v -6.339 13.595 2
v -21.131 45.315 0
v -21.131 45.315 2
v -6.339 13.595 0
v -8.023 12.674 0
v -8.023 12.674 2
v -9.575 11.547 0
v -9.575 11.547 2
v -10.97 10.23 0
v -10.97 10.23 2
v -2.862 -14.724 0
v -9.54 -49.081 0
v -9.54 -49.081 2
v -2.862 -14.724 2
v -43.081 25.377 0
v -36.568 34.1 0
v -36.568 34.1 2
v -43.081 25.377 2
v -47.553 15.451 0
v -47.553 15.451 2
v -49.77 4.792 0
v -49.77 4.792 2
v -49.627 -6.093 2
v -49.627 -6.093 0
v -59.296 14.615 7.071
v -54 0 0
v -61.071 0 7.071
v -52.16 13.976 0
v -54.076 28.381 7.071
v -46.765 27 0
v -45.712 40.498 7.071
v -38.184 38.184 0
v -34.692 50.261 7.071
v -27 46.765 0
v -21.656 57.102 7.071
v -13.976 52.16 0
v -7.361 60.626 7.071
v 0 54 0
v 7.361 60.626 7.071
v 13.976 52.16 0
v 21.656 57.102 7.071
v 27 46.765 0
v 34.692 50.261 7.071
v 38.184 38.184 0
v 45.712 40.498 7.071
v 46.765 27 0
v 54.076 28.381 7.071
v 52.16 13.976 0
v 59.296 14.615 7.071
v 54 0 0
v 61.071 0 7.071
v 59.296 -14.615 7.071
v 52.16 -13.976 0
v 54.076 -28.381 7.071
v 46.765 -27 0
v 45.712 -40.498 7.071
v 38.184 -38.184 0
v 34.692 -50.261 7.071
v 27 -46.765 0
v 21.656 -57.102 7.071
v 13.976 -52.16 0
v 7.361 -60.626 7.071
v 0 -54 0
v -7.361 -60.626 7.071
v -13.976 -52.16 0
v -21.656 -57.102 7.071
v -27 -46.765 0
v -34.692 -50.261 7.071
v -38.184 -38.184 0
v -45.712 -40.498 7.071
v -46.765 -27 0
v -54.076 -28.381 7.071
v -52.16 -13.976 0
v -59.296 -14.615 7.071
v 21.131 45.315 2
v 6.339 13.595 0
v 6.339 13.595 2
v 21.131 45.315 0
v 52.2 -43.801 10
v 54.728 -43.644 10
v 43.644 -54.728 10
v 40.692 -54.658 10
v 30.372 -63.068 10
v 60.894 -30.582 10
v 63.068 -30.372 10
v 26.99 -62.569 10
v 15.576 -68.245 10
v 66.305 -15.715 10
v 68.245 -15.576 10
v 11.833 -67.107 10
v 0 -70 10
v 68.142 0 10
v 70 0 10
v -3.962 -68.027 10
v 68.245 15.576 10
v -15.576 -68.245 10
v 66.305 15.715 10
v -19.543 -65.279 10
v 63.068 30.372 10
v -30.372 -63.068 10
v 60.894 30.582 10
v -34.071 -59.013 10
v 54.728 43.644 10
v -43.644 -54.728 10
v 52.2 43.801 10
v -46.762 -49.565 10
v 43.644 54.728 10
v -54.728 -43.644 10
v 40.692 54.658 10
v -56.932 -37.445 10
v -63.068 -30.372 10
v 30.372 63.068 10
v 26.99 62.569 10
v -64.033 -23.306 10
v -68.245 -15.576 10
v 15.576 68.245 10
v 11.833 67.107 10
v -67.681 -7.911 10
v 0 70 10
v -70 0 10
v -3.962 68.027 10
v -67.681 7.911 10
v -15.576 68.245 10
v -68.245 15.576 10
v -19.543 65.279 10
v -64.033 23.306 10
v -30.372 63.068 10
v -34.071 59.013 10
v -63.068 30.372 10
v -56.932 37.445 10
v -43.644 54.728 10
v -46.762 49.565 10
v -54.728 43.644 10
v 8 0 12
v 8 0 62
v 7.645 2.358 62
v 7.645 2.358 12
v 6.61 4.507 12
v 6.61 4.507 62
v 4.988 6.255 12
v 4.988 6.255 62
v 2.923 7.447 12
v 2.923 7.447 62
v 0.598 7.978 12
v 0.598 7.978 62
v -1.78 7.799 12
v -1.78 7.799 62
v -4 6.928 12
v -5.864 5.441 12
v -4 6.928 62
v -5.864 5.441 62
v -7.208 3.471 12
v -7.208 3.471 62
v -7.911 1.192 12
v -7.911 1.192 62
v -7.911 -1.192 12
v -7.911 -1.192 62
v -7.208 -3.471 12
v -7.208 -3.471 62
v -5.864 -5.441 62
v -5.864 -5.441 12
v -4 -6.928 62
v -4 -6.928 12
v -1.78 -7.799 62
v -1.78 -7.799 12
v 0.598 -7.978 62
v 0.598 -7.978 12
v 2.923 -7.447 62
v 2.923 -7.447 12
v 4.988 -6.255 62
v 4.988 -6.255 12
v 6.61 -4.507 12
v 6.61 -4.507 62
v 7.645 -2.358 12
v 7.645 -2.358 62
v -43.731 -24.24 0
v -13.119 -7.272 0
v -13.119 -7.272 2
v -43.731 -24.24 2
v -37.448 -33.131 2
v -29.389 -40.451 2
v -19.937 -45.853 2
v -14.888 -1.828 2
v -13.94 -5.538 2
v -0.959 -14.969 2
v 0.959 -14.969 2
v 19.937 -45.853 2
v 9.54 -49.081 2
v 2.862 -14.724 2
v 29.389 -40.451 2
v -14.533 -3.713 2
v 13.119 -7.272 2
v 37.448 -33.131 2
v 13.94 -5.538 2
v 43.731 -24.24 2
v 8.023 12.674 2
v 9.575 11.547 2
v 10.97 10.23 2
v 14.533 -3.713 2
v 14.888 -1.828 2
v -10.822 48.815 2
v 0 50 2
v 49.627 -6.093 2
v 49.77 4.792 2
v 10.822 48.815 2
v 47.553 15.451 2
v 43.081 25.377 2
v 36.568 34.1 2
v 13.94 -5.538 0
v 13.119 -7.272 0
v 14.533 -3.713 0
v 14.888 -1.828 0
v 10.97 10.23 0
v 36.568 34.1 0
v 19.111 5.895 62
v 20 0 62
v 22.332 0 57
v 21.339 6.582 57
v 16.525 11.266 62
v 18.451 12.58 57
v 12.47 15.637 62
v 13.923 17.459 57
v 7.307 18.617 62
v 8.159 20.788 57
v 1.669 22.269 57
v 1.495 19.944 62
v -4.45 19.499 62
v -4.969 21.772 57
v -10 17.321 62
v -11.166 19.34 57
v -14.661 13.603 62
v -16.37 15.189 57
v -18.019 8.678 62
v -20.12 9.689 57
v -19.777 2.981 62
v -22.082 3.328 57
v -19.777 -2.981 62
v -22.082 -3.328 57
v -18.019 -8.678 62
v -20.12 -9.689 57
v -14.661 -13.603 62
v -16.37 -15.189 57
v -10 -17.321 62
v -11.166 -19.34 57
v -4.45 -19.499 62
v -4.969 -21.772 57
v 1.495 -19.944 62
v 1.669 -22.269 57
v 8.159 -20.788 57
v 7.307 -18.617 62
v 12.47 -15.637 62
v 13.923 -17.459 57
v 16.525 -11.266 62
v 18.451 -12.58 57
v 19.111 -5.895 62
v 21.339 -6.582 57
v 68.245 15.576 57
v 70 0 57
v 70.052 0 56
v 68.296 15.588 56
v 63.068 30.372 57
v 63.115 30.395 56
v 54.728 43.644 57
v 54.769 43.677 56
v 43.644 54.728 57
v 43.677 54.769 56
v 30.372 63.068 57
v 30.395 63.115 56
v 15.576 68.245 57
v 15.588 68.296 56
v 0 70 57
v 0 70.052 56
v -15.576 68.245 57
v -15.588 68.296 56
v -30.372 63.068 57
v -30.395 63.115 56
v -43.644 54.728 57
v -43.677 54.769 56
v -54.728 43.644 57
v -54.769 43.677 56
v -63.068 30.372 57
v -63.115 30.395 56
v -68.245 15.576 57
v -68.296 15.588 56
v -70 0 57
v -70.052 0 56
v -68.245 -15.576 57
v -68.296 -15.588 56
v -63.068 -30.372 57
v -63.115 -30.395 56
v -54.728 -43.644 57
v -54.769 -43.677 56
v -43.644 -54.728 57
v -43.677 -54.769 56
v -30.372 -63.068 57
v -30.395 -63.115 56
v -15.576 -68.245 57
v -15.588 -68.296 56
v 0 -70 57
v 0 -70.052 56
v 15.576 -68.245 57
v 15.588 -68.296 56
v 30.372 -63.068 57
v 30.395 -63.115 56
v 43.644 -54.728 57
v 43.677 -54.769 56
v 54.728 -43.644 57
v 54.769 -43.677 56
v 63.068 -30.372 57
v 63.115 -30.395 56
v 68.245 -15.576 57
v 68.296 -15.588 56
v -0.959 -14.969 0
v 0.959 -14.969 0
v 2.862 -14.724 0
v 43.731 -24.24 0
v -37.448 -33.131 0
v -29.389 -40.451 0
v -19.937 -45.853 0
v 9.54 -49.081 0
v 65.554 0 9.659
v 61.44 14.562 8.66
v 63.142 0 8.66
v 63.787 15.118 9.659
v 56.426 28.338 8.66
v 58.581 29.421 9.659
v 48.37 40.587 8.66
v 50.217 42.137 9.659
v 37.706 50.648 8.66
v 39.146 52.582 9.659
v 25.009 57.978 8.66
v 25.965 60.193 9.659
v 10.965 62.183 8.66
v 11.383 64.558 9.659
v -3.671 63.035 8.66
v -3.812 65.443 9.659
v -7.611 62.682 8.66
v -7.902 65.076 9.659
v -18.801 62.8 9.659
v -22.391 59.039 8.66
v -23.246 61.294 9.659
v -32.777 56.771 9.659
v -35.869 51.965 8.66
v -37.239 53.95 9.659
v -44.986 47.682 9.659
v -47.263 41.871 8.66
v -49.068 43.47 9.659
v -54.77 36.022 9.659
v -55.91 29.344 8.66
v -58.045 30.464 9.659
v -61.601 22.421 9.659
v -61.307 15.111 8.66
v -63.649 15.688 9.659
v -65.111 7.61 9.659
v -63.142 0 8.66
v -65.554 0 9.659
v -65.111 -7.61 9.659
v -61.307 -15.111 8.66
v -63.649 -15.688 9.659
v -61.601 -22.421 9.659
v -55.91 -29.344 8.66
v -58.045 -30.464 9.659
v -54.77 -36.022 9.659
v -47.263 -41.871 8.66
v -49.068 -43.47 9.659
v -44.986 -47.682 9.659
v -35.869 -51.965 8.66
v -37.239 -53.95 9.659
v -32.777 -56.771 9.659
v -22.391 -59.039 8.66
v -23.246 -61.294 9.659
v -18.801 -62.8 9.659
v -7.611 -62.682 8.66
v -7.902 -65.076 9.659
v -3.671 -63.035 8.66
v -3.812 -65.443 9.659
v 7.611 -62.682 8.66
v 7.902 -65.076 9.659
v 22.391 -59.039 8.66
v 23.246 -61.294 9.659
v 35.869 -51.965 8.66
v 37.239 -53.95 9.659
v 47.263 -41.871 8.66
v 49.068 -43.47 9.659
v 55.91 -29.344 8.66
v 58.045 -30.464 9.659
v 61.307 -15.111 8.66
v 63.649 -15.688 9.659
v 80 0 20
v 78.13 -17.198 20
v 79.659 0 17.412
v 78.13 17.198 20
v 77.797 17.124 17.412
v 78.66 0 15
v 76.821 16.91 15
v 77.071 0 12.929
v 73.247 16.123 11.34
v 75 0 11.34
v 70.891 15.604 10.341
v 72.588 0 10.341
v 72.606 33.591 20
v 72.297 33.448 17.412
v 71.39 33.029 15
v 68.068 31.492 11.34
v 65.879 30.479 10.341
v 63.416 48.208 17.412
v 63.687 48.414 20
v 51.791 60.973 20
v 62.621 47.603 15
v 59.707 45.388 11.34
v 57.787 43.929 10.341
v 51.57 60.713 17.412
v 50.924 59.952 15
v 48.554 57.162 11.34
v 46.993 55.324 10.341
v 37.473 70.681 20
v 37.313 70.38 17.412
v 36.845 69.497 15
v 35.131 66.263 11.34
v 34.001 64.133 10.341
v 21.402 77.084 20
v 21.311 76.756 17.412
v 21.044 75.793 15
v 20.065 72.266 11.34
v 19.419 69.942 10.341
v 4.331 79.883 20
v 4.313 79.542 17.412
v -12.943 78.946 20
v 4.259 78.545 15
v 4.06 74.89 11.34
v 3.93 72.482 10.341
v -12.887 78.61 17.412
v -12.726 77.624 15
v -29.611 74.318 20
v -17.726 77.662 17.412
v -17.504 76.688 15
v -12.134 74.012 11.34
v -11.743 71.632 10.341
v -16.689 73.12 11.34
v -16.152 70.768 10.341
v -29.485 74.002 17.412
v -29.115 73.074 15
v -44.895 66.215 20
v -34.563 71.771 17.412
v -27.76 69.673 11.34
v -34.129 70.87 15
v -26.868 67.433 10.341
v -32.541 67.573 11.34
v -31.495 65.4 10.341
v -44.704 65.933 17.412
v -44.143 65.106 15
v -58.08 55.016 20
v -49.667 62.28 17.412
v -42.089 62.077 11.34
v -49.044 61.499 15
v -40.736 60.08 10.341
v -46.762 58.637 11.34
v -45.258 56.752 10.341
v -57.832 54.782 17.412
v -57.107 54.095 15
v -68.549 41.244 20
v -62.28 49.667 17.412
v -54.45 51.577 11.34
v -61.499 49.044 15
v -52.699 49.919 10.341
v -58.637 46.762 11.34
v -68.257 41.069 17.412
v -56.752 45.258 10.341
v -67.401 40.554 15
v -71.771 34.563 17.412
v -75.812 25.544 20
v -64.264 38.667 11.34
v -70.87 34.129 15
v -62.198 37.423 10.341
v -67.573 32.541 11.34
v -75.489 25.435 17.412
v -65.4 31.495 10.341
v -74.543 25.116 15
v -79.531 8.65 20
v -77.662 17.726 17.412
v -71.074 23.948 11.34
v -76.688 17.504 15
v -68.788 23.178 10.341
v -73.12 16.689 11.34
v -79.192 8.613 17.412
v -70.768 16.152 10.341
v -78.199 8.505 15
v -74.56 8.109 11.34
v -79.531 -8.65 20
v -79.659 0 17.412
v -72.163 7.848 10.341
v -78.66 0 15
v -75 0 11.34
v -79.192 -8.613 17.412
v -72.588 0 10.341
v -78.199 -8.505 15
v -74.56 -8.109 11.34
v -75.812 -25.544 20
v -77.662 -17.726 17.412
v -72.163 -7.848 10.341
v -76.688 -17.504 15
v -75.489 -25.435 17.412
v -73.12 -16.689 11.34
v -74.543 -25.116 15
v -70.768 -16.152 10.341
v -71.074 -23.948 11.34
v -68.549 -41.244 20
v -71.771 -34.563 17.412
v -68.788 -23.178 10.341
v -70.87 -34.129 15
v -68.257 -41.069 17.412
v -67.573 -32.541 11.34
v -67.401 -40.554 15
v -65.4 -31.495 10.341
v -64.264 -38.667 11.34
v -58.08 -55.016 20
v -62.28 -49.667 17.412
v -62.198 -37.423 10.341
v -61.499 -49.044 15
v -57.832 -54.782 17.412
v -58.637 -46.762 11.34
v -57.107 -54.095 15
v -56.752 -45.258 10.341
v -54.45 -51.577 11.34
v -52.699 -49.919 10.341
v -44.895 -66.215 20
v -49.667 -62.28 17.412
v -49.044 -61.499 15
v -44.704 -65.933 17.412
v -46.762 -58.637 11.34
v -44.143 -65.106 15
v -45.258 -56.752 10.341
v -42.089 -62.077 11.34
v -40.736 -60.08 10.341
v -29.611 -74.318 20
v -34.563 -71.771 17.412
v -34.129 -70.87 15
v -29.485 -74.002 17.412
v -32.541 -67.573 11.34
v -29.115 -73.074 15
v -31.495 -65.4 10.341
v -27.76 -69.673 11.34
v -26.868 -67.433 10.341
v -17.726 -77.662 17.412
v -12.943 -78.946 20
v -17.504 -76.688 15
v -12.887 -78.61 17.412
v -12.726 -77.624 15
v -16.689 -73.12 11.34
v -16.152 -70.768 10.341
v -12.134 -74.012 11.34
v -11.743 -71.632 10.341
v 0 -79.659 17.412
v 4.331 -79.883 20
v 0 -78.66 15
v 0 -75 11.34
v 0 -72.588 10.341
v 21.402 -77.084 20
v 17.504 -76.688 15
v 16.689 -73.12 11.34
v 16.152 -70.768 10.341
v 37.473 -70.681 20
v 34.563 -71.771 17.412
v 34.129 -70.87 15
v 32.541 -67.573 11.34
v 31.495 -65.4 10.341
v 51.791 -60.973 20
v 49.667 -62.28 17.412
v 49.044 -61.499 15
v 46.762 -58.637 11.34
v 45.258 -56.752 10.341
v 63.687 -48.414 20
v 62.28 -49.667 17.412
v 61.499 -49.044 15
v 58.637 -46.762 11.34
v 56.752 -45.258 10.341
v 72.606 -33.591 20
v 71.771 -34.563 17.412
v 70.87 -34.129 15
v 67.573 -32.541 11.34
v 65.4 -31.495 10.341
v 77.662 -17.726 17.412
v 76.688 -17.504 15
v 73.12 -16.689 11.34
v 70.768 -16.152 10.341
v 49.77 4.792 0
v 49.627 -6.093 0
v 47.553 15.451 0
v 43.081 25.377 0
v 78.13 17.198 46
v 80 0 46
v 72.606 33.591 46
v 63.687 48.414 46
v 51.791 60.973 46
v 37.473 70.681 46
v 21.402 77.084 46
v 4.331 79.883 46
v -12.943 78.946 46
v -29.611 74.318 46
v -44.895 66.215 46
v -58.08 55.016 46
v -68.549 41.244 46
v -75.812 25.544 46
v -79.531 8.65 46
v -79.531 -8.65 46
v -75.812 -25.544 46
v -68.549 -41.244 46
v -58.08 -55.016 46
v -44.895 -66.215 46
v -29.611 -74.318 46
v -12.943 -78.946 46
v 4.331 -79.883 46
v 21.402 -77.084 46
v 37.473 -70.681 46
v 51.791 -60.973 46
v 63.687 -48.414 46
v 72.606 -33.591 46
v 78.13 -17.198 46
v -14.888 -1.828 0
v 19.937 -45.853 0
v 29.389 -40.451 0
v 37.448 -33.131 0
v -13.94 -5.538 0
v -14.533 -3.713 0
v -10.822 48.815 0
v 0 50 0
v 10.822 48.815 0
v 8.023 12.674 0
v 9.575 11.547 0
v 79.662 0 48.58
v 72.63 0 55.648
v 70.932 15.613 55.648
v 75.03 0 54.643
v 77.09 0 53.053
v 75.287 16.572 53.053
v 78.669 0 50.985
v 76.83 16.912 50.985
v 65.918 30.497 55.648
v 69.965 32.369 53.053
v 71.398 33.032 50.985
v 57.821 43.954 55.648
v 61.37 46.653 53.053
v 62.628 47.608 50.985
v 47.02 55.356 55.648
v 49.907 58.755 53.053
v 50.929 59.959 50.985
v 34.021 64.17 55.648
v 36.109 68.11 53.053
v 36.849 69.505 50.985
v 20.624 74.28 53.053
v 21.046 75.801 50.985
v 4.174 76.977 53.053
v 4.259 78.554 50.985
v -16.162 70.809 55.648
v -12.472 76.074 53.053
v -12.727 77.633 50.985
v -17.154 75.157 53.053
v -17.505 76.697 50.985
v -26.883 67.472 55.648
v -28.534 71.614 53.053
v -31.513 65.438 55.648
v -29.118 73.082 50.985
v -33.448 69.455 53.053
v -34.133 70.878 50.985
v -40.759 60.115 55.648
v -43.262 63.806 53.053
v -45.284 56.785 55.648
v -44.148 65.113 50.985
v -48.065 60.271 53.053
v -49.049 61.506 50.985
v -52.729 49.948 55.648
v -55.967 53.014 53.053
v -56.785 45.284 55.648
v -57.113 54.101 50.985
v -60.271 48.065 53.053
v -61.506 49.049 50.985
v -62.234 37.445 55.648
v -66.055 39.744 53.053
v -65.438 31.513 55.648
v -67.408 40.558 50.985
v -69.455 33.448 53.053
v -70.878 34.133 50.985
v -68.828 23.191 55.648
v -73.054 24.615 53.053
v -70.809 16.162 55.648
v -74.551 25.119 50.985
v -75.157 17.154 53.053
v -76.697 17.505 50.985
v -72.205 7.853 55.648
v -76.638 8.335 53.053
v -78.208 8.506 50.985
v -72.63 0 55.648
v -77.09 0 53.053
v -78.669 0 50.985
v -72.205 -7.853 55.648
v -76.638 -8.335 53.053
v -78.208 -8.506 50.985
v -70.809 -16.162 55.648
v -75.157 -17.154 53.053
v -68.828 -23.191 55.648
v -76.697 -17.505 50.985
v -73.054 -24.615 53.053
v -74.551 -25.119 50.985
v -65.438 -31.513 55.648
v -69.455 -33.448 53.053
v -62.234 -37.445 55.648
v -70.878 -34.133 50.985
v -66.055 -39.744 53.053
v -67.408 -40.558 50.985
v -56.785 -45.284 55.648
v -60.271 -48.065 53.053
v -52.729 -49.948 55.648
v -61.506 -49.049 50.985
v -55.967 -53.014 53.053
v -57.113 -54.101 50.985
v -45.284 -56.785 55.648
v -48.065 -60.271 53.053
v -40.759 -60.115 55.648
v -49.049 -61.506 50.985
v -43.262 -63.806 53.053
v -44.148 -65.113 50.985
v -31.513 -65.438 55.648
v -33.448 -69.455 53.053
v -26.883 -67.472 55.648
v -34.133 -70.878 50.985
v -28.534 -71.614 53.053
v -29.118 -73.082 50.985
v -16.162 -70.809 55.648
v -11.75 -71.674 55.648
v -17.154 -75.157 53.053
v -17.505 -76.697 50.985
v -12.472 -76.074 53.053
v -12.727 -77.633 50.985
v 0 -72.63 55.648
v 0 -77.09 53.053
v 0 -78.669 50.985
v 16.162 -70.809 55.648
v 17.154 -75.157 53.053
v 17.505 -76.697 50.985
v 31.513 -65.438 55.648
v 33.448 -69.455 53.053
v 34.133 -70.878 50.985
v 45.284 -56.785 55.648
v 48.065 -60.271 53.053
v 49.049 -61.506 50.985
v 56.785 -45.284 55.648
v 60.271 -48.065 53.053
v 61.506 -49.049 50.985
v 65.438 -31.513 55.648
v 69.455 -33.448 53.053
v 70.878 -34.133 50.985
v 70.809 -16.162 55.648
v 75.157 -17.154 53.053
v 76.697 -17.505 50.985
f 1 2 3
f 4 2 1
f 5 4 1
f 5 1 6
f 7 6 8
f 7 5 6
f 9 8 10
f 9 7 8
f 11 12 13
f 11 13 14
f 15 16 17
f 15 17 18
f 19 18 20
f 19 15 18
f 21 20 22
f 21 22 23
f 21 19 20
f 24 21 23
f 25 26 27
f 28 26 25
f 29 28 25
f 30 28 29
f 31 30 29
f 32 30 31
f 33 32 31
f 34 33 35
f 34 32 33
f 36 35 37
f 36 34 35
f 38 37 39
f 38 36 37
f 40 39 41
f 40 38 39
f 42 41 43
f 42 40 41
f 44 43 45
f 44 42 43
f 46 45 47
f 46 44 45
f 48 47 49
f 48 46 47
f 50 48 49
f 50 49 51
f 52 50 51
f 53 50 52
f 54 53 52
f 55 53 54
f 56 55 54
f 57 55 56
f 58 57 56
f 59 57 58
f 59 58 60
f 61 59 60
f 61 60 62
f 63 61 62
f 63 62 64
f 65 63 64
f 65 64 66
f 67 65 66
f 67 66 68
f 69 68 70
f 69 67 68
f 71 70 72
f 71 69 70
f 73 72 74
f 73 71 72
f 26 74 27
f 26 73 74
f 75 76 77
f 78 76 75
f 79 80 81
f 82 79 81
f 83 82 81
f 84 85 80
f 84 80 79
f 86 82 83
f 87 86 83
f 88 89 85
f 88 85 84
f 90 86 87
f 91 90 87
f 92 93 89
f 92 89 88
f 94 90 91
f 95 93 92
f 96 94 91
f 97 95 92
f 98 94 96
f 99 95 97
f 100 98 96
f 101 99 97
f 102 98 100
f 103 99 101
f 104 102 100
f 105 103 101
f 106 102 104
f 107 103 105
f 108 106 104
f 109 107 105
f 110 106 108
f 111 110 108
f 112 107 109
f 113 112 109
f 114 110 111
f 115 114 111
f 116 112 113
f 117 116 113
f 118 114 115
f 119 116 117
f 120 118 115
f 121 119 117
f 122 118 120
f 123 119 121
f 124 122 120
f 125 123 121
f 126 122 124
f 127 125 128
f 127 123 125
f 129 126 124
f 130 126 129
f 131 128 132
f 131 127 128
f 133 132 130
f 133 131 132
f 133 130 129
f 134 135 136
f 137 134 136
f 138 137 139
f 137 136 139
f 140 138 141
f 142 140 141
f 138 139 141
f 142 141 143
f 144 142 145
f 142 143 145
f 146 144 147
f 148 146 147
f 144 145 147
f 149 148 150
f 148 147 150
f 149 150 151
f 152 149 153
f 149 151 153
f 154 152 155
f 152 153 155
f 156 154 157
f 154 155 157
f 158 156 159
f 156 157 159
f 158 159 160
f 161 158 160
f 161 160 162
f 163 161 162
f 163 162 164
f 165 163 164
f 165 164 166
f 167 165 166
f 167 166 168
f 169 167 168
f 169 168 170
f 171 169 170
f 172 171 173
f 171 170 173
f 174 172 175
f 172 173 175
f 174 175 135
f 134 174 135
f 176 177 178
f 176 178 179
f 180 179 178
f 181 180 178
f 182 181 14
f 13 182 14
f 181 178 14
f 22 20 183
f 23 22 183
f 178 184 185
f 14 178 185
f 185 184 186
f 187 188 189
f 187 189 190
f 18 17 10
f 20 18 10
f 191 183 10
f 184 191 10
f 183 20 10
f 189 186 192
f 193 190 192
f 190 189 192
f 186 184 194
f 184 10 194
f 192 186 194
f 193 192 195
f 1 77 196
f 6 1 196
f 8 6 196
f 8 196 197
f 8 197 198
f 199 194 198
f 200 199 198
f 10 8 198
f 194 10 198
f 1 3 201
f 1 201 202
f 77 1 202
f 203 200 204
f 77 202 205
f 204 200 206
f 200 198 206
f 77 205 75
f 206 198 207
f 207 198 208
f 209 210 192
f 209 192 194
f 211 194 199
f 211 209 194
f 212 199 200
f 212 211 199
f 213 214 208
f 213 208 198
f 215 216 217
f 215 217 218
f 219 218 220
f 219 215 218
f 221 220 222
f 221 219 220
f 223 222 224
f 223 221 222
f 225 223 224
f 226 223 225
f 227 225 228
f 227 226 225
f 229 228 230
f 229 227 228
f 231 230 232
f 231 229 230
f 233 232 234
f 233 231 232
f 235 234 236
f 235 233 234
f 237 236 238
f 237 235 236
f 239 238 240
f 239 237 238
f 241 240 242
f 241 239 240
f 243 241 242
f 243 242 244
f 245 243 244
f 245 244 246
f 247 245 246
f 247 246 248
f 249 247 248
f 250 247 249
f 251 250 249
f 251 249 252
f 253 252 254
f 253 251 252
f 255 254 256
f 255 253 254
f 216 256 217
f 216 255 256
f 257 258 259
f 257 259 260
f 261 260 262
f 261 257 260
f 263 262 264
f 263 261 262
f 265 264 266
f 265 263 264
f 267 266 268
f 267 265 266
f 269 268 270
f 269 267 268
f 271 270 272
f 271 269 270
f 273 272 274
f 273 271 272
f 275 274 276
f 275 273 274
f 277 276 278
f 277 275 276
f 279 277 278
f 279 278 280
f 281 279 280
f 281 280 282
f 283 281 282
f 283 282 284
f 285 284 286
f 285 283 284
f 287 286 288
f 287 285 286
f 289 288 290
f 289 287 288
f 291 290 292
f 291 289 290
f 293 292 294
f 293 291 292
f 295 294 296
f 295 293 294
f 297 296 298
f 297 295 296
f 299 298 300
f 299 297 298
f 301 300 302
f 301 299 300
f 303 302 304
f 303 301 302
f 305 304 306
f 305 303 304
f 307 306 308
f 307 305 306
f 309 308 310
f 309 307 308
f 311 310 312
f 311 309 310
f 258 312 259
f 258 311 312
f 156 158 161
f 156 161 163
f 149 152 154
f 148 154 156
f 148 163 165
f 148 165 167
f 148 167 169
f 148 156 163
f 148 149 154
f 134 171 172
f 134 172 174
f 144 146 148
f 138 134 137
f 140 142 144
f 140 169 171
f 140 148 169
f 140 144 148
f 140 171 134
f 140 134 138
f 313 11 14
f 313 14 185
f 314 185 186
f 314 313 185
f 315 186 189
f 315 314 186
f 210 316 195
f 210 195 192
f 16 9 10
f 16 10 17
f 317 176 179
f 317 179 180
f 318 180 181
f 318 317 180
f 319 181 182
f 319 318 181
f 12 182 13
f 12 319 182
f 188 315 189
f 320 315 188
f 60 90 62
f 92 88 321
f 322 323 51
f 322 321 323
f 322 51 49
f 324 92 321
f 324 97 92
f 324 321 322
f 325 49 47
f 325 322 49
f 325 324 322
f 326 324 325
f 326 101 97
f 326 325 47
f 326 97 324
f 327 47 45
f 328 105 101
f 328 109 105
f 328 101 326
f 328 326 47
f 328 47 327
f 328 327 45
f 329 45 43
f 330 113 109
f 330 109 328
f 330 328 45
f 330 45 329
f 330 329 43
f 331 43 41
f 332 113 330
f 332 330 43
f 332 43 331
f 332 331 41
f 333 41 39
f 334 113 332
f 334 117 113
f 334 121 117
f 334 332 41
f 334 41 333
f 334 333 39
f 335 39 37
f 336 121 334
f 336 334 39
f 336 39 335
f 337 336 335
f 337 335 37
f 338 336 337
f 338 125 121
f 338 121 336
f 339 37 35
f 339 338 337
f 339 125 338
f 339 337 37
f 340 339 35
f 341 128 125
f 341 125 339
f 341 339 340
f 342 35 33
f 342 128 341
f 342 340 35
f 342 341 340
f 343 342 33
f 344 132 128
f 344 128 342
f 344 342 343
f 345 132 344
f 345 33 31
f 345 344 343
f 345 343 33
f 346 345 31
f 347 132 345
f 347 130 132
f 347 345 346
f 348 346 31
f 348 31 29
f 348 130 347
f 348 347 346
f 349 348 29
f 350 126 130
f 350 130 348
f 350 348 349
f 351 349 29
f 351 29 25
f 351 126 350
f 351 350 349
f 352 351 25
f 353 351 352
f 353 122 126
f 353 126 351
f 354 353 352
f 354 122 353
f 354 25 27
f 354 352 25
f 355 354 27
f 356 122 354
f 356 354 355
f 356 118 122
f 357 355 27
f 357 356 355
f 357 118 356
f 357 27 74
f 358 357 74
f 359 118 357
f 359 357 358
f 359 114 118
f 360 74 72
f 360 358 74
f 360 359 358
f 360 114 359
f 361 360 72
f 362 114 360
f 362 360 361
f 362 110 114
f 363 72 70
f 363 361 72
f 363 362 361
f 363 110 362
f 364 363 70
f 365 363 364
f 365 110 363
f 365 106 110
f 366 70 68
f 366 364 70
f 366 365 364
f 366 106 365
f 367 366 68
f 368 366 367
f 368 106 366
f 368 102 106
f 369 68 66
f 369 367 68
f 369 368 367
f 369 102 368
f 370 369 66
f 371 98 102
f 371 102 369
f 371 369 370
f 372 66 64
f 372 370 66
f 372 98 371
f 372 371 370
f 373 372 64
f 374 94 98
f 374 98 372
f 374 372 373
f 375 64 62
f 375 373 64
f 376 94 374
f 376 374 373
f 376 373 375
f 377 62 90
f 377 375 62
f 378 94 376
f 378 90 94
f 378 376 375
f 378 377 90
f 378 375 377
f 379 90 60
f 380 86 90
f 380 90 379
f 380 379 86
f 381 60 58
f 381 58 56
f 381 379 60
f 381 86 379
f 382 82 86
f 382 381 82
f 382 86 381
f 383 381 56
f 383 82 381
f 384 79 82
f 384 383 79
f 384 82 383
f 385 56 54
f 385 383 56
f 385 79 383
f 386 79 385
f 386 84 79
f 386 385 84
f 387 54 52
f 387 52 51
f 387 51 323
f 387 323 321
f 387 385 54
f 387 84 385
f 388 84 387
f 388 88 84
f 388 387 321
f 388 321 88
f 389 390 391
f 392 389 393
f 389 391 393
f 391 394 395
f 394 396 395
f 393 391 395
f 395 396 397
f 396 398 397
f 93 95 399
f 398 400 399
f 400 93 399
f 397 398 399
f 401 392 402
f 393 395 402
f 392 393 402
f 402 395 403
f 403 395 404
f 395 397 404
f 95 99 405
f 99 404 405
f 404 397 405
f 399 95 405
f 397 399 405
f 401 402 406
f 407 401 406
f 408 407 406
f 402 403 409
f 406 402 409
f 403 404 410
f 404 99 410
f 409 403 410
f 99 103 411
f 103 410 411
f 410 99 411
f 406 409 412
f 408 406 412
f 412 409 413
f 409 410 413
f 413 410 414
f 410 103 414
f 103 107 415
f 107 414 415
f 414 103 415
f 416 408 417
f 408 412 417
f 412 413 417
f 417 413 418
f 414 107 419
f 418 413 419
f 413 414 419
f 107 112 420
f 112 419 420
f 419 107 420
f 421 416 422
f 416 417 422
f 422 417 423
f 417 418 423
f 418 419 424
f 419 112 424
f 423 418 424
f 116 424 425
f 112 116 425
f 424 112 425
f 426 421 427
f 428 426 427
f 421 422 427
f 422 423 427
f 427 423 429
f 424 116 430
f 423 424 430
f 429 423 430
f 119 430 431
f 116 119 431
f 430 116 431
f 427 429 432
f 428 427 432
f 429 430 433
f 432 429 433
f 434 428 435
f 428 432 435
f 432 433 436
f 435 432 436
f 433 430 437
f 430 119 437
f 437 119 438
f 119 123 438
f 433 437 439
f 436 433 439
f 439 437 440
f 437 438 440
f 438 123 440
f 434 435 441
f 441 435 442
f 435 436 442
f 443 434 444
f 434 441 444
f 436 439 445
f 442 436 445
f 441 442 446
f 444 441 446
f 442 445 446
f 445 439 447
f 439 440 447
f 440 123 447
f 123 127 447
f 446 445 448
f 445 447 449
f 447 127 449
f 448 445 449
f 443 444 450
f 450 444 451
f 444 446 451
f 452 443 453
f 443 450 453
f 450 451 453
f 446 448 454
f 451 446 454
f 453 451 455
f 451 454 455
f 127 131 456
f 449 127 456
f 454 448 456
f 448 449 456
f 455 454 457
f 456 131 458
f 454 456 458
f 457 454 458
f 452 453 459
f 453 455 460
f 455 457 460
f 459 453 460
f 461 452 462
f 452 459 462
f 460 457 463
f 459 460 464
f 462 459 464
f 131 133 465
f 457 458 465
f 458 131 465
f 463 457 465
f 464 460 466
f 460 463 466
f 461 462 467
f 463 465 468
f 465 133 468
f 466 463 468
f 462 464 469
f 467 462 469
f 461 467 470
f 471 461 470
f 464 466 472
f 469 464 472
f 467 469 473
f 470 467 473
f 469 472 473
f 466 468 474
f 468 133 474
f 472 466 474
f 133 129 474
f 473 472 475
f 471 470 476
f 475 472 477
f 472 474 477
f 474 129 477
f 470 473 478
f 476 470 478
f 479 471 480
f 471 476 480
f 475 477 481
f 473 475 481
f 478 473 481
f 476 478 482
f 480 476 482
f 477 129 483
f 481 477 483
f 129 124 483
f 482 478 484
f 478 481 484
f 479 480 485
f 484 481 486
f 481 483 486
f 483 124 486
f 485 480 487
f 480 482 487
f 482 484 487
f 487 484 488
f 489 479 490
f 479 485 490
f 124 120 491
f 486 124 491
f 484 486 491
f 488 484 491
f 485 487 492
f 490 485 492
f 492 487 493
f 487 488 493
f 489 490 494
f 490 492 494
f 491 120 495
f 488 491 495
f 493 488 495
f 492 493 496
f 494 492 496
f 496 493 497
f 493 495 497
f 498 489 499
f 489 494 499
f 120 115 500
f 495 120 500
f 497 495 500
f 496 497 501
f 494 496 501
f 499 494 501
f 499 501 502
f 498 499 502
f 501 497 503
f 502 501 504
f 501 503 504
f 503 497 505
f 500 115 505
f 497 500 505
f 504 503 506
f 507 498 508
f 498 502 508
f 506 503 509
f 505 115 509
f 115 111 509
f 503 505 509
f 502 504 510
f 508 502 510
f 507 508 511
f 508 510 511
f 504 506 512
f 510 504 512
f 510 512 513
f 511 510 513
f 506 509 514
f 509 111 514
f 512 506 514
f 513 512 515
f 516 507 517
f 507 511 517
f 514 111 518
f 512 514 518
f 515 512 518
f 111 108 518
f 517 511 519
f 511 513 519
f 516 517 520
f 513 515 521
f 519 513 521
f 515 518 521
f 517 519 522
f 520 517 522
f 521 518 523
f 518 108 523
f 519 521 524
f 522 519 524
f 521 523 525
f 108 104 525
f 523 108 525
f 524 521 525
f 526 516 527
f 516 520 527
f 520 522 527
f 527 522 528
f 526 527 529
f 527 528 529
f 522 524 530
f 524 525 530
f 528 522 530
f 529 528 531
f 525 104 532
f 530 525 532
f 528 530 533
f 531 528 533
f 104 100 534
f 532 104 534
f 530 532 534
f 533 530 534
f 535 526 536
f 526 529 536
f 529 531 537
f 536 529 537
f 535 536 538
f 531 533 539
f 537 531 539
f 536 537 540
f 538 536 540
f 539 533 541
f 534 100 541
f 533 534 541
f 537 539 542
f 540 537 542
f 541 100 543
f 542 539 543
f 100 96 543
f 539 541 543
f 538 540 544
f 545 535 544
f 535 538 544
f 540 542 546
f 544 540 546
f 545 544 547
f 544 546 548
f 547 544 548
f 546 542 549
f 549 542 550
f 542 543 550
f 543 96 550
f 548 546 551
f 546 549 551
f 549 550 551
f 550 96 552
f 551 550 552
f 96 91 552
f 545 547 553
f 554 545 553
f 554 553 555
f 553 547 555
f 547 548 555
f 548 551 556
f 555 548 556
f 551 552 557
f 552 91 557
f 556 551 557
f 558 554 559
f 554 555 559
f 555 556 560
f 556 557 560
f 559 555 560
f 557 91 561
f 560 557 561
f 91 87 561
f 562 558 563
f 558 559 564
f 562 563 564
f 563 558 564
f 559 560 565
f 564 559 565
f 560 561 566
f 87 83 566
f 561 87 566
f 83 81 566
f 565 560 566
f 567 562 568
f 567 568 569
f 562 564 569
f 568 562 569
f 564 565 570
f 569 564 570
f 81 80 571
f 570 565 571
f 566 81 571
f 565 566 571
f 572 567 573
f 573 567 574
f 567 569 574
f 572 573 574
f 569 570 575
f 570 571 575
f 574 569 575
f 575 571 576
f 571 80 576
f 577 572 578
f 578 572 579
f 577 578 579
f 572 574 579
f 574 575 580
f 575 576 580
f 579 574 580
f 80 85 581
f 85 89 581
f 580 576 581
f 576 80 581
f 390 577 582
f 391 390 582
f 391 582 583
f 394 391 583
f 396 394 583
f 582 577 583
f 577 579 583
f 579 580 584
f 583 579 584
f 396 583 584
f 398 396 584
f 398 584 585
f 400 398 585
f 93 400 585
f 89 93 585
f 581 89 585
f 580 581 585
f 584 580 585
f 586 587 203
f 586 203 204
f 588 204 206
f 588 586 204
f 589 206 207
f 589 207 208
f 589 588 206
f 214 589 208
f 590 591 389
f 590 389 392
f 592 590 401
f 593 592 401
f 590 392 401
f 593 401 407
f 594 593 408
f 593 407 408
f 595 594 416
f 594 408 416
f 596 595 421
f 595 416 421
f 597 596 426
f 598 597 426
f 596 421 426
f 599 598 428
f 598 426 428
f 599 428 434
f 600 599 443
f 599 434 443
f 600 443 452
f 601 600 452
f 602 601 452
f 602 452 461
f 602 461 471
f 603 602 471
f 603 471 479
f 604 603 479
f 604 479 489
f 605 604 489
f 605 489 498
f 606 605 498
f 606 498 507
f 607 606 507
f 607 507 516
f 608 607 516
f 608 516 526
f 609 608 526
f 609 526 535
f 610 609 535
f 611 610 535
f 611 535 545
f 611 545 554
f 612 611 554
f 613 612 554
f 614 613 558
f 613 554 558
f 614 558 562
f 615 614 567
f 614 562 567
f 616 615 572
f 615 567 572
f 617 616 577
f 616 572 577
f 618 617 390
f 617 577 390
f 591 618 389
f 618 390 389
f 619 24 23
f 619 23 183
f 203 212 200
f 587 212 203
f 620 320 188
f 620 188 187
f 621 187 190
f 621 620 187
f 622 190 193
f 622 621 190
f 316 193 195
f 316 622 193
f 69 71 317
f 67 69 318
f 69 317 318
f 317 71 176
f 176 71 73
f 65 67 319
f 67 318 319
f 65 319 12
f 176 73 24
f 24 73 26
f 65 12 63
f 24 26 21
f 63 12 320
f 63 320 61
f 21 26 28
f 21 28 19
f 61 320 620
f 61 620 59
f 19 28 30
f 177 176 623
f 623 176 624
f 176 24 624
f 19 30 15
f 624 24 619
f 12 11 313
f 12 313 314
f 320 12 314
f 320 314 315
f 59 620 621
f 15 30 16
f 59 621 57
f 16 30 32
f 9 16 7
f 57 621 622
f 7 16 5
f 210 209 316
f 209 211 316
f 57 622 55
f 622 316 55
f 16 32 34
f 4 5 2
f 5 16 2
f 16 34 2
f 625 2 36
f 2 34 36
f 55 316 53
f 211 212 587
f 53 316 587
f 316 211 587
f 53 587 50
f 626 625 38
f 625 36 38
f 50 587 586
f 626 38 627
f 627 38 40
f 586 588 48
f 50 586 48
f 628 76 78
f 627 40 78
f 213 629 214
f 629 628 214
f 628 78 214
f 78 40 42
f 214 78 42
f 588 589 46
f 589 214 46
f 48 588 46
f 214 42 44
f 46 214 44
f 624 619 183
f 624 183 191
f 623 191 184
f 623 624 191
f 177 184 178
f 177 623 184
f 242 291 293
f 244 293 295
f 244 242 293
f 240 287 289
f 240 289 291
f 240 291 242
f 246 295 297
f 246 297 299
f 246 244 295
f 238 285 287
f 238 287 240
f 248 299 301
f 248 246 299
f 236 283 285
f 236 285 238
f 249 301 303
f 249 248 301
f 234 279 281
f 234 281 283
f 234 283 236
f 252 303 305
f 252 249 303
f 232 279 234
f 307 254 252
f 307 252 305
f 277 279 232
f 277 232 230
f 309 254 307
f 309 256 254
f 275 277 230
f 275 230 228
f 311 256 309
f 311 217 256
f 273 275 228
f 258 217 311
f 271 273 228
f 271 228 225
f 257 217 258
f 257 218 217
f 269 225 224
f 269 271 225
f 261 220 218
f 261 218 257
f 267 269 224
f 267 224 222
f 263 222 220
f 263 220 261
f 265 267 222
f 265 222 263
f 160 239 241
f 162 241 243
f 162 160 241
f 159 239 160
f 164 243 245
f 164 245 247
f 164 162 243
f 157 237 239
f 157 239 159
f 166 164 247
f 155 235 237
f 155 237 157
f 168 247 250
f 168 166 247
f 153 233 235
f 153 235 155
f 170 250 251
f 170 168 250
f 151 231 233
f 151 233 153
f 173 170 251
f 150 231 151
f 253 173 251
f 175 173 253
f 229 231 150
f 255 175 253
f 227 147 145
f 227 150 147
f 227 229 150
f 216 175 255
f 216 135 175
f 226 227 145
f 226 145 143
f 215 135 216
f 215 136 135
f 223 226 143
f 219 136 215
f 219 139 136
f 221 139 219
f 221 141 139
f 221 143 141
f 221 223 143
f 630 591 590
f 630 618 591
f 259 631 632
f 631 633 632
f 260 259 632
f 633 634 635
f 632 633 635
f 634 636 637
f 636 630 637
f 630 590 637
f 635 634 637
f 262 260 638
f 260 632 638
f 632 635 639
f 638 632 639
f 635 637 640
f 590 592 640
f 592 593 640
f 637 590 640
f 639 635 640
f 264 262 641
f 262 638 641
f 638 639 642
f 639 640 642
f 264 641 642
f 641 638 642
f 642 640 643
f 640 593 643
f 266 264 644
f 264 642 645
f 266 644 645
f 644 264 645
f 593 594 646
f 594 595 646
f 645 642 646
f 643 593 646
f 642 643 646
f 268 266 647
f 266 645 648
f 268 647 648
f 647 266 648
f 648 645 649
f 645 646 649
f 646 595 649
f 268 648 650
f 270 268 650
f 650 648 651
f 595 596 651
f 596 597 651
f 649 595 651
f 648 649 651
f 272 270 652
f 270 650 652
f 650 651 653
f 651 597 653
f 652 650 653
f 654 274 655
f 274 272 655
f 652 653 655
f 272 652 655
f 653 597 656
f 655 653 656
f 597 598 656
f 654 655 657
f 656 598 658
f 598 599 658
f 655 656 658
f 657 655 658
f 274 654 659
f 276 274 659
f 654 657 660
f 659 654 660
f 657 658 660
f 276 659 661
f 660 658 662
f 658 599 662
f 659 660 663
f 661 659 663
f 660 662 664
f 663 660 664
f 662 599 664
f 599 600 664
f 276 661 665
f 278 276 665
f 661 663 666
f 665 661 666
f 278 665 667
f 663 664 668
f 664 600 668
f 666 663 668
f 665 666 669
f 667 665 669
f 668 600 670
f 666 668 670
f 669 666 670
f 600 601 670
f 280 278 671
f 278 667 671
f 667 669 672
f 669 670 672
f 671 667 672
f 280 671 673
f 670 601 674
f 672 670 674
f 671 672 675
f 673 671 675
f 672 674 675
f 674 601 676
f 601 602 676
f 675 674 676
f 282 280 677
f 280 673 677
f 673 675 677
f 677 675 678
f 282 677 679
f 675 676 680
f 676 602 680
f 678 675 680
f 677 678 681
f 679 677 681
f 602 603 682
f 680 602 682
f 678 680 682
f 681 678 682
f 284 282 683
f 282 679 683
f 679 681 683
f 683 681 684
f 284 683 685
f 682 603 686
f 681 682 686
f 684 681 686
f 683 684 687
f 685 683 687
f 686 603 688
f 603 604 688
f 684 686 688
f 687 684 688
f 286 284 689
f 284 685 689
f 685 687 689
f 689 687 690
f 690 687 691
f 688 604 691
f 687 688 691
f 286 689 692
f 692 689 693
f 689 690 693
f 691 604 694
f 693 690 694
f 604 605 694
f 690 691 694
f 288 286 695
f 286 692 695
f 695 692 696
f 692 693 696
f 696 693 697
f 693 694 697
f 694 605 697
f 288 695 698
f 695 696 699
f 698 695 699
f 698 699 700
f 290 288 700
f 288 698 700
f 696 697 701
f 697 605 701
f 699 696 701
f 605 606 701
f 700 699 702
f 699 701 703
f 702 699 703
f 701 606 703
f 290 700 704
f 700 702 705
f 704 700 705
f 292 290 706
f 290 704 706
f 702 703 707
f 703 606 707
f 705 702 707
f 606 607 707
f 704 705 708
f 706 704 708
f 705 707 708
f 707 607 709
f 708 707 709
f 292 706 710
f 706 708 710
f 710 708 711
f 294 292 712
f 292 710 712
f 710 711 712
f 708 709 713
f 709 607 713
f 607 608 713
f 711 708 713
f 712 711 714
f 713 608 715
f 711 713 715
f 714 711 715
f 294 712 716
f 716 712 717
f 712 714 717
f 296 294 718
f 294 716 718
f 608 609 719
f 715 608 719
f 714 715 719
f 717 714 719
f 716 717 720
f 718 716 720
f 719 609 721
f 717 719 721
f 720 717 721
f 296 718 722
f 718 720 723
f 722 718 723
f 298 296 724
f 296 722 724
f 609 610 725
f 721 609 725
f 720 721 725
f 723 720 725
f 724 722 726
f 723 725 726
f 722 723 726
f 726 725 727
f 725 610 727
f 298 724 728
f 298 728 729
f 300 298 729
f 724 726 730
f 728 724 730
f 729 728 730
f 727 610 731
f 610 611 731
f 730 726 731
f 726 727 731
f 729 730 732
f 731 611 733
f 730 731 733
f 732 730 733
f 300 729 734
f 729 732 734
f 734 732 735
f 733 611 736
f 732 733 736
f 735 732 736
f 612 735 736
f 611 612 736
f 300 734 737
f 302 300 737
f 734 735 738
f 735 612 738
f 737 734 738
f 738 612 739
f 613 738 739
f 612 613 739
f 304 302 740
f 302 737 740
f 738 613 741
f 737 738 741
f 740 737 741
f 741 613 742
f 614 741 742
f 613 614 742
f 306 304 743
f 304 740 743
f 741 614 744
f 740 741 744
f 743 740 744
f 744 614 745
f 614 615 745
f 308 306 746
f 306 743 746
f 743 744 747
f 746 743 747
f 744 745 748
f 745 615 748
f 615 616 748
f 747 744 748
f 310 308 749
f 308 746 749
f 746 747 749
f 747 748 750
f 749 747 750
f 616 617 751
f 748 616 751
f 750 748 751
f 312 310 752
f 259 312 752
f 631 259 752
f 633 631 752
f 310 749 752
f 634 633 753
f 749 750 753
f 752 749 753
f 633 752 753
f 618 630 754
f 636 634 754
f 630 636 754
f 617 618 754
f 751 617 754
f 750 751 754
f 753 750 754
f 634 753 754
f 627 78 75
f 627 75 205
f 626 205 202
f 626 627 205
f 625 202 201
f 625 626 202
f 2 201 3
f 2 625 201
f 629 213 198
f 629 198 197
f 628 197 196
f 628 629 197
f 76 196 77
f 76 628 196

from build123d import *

# Parameters (mm, degrees)
SKETCH1_R           = 80
BOSS_EXTRUDE1_DEPTH = 62
SKETCH3_OUTSIDE_W   = 228.922
SKETCH3_OUTSIDE_H   = 228.922
SKETCH3_OUTSIDE_R   = 54
CUT_EXTRUDE1_DEPTH  = 10
CUT_EXTRUDE1_DRAFT  = -45
SKETCH4_OUTSIDE_W   = 213.586
SKETCH4_OUTSIDE_H   = 213.586
SKETCH4_OUTSIDE_R   = 20
CUT_EXTRUDE2_DEPTH  = 5
CUT_EXTRUDE2_DRAFT  = -25
CUT_EXTRUDE3_DEPTH  = 2
SKETCH6_OUTSIDE_W   = 209.028
SKETCH6_OUTSIDE_H   = 209.028
SKETCH6_OUTSIDE_R   = 70
CUT_EXTRUDE4_DEPTH  = 1
CUT_EXTRUDE4_DRAFT  = -3
SKETCH2_R           = 8
CUT_EXTRUDE5_DEPTH  = 50


with BuildPart() as part:
    # Sketch1 → Boss-Extrude1 (new body)
    with BuildSketch(Plane.XY):
        Circle(SKETCH1_R)
    extrude(amount=BOSS_EXTRUDE1_DEPTH)


with BuildPart() as cut_extrude1_tool:
    # Sketch3 outside → Cut-Extrude1 (with draft: the straight prism first)
    with BuildSketch(Plane(origin=(0, 0, 0), x_dir=(-1, 0, 0), z_dir=(0, 0, -1))):
        Rectangle(SKETCH3_OUTSIDE_W, SKETCH3_OUTSIDE_H)
        Circle(SKETCH3_OUTSIDE_R, mode=Mode.SUBTRACT)
    extrude(amount=-CUT_EXTRUDE1_DEPTH)
    # Cut-Extrude1: the draft: its side faces are tilted about the plane it starts from
    cut_extrude1_sides = [cut_extrude1_tool.faces().sort_by_distance(p)[0] for p in [
        (0, -114.461, 5),
        (-114.461, 0, 5),
        (0, 114.461, 5),
        (114.461, 0, 5),
        (54, 0, 5),
    ]]
    draft(cut_extrude1_sides, Plane(origin=(0, 0, 0), x_dir=(-1, 0, 0), z_dir=(0, 0, -1)), CUT_EXTRUDE1_DRAFT)


with BuildPart() as part_1:
    add(part.part)

    # Cut-Extrude1: cut by cut_extrude1_tool
    add(cut_extrude1_tool.part, mode=Mode.SUBTRACT)


with BuildPart() as cut_extrude2_tool:
    # Sketch4 outside → Cut-Extrude2 (with draft: the straight prism first)
    with BuildSketch(Plane.XY.offset(62)):
        Rectangle(SKETCH4_OUTSIDE_W, SKETCH4_OUTSIDE_H)
        Circle(SKETCH4_OUTSIDE_R, mode=Mode.SUBTRACT)
    extrude(amount=-CUT_EXTRUDE2_DEPTH)
    # Cut-Extrude2: the draft: its side faces are tilted about the plane it starts from
    cut_extrude2_sides = [cut_extrude2_tool.faces().sort_by_distance(p)[0] for p in [
        (0, -106.793, 59.5),
        (106.793, 0, 59.5),
        (0, 106.793, 59.5),
        (-106.793, 0, 59.5),
        (-20, 0, 59.5),
    ]]
    draft(cut_extrude2_sides, Plane.XY.offset(62), CUT_EXTRUDE2_DRAFT)


with BuildPart() as part_2:
    add(part_1.part)

    # Cut-Extrude2: cut by cut_extrude2_tool
    add(cut_extrude2_tool.part, mode=Mode.SUBTRACT)

    # Sketch5 → Cut-Extrude3 (cut)
    with BuildSketch(Plane(origin=(0, 0, 0), x_dir=(-1, 0, 0), z_dir=(0, 0, -1))):
        with BuildLine():
            Line((10.970305524, 10.229975401), (36.567685081, 34.099918003))
            ThreePointArc((36.567685081, 34.099918003), (47.552825815, 15.450849719), (49.627307582, -6.09346717))
            Line((49.627307582, -6.09346717), (14.888192275, -1.828040151))
            ThreePointArc((14.888192275, -1.828040151), (14.265847744, -4.635254916), (13.119295607, -7.272144304))
            Line((13.119295607, -7.272144304), (43.730985357, -24.240481012))
            ThreePointArc((43.730985357, -24.240481012), (29.389262615, -40.450849719), (9.540449769, -49.081359172))
            Line((9.540449769, -49.081359172), (2.862134931, -14.724407752))
            ThreePointArc((2.862134931, -14.724407752), (0, -15), (-2.862134931, -14.724407752))
            Line((-2.862134931, -14.724407752), (-9.540449769, -49.081359172))
            ThreePointArc((-9.540449769, -49.081359172), (-29.389262615, -40.450849719), (-43.730985357, -24.240481012))
            Line((-43.730985357, -24.240481012), (-13.119295607, -7.272144304))
            ThreePointArc((-13.119295607, -7.272144304), (-14.265847744, -4.635254916), (-14.888192275, -1.828040151))
            Line((-14.888192275, -1.828040151), (-49.627307582, -6.09346717))
            ThreePointArc((-49.627307582, -6.09346717), (-47.552825815, 15.450849719), (-36.567685081, 34.099918003))
            Line((-36.567685081, 34.099918003), (-10.970305524, 10.229975401))
            ThreePointArc((-10.970305524, 10.229975401), (-8.816778784, 12.135254916), (-6.339273926, 13.594616806))
            Line((-6.339273926, 13.594616806), (-21.130913087, 45.315389352))
            ThreePointArc((-21.130913087, 45.315389352), (0, 50), (21.130913087, 45.315389352))
            Line((21.130913087, 45.315389352), (6.339273926, 13.594616806))
            ThreePointArc((6.339273926, 13.594616806), (8.816778784, 12.135254916), (10.970305524, 10.229975401))
        make_face()
    extrude(amount=-CUT_EXTRUDE3_DEPTH, mode=Mode.SUBTRACT)


with BuildPart() as cut_extrude4_tool:
    # Sketch6 outside → Cut-Extrude4 (with draft: the straight prism first)
    with BuildSketch(Plane.XY.offset(57)):
        Rectangle(SKETCH6_OUTSIDE_W, SKETCH6_OUTSIDE_H)
        Circle(SKETCH6_OUTSIDE_R, mode=Mode.SUBTRACT)
    extrude(amount=-CUT_EXTRUDE4_DEPTH)
    # Cut-Extrude4: the draft: its side faces are tilted about the plane it starts from
    cut_extrude4_sides = [cut_extrude4_tool.faces().sort_by_distance(p)[0] for p in [
        (0, -104.514, 56.5),
        (104.514, 0, 56.5),
        (0, 104.514, 56.5),
        (-104.514, 0, 56.5),
        (-70, 0, 56.5),
    ]]
    draft(cut_extrude4_sides, Plane.XY.offset(57), CUT_EXTRUDE4_DRAFT)


with BuildPart() as part_3:
    add(part_2.part)

    # Cut-Extrude4: cut by cut_extrude4_tool
    add(cut_extrude4_tool.part, mode=Mode.SUBTRACT)

    # Fillet1: read off the stored shape, not the designer's step
    # Fillet1 outline → Fillet1 (revolve, cut)
    with BuildSketch(Plane.XZ):
        with BuildLine():
            ThreePointArc((80, 20), (77.071067812, 12.928932188), (70, 10))
            Line((70, 10), (80, 10))
            Line((80, 10), (80, 20))
        make_face()
        with BuildLine():
            ThreePointArc((70.052407779, 56), (77.089572547, 53.052651853), (80, 46.00013733))
            Line((80, 46.00013733), (80, 56))
            Line((80, 56), (70.052407779, 56))
        make_face()
    revolve(axis=Axis((0, 0, 0), (0, 0, 1)), mode=Mode.SUBTRACT)

    # Fillet1 2 outline → Fillet1 2 (revolve)
    with BuildSketch(Plane.XZ):
        with BuildLine():
            Line((61.071067812, 10), (61.071067812, 7.071067812))
            ThreePointArc((61.071067812, 7.071067812), (64.3153013, 9.238795325), (68.142135624, 10))
            Line((68.142135624, 10), (61.071067812, 10))
        make_face()
    revolve(axis=Axis((0, 0, 0), (0, 0, 1)))

    # Sketch2 → Cut-Extrude5 (cut)
    with BuildSketch(Plane.XY.offset(62)):
        Circle(SKETCH2_R)
    extrude(amount=-CUT_EXTRUDE5_DEPTH, mode=Mode.SUBTRACT)


solid = part_3.part
